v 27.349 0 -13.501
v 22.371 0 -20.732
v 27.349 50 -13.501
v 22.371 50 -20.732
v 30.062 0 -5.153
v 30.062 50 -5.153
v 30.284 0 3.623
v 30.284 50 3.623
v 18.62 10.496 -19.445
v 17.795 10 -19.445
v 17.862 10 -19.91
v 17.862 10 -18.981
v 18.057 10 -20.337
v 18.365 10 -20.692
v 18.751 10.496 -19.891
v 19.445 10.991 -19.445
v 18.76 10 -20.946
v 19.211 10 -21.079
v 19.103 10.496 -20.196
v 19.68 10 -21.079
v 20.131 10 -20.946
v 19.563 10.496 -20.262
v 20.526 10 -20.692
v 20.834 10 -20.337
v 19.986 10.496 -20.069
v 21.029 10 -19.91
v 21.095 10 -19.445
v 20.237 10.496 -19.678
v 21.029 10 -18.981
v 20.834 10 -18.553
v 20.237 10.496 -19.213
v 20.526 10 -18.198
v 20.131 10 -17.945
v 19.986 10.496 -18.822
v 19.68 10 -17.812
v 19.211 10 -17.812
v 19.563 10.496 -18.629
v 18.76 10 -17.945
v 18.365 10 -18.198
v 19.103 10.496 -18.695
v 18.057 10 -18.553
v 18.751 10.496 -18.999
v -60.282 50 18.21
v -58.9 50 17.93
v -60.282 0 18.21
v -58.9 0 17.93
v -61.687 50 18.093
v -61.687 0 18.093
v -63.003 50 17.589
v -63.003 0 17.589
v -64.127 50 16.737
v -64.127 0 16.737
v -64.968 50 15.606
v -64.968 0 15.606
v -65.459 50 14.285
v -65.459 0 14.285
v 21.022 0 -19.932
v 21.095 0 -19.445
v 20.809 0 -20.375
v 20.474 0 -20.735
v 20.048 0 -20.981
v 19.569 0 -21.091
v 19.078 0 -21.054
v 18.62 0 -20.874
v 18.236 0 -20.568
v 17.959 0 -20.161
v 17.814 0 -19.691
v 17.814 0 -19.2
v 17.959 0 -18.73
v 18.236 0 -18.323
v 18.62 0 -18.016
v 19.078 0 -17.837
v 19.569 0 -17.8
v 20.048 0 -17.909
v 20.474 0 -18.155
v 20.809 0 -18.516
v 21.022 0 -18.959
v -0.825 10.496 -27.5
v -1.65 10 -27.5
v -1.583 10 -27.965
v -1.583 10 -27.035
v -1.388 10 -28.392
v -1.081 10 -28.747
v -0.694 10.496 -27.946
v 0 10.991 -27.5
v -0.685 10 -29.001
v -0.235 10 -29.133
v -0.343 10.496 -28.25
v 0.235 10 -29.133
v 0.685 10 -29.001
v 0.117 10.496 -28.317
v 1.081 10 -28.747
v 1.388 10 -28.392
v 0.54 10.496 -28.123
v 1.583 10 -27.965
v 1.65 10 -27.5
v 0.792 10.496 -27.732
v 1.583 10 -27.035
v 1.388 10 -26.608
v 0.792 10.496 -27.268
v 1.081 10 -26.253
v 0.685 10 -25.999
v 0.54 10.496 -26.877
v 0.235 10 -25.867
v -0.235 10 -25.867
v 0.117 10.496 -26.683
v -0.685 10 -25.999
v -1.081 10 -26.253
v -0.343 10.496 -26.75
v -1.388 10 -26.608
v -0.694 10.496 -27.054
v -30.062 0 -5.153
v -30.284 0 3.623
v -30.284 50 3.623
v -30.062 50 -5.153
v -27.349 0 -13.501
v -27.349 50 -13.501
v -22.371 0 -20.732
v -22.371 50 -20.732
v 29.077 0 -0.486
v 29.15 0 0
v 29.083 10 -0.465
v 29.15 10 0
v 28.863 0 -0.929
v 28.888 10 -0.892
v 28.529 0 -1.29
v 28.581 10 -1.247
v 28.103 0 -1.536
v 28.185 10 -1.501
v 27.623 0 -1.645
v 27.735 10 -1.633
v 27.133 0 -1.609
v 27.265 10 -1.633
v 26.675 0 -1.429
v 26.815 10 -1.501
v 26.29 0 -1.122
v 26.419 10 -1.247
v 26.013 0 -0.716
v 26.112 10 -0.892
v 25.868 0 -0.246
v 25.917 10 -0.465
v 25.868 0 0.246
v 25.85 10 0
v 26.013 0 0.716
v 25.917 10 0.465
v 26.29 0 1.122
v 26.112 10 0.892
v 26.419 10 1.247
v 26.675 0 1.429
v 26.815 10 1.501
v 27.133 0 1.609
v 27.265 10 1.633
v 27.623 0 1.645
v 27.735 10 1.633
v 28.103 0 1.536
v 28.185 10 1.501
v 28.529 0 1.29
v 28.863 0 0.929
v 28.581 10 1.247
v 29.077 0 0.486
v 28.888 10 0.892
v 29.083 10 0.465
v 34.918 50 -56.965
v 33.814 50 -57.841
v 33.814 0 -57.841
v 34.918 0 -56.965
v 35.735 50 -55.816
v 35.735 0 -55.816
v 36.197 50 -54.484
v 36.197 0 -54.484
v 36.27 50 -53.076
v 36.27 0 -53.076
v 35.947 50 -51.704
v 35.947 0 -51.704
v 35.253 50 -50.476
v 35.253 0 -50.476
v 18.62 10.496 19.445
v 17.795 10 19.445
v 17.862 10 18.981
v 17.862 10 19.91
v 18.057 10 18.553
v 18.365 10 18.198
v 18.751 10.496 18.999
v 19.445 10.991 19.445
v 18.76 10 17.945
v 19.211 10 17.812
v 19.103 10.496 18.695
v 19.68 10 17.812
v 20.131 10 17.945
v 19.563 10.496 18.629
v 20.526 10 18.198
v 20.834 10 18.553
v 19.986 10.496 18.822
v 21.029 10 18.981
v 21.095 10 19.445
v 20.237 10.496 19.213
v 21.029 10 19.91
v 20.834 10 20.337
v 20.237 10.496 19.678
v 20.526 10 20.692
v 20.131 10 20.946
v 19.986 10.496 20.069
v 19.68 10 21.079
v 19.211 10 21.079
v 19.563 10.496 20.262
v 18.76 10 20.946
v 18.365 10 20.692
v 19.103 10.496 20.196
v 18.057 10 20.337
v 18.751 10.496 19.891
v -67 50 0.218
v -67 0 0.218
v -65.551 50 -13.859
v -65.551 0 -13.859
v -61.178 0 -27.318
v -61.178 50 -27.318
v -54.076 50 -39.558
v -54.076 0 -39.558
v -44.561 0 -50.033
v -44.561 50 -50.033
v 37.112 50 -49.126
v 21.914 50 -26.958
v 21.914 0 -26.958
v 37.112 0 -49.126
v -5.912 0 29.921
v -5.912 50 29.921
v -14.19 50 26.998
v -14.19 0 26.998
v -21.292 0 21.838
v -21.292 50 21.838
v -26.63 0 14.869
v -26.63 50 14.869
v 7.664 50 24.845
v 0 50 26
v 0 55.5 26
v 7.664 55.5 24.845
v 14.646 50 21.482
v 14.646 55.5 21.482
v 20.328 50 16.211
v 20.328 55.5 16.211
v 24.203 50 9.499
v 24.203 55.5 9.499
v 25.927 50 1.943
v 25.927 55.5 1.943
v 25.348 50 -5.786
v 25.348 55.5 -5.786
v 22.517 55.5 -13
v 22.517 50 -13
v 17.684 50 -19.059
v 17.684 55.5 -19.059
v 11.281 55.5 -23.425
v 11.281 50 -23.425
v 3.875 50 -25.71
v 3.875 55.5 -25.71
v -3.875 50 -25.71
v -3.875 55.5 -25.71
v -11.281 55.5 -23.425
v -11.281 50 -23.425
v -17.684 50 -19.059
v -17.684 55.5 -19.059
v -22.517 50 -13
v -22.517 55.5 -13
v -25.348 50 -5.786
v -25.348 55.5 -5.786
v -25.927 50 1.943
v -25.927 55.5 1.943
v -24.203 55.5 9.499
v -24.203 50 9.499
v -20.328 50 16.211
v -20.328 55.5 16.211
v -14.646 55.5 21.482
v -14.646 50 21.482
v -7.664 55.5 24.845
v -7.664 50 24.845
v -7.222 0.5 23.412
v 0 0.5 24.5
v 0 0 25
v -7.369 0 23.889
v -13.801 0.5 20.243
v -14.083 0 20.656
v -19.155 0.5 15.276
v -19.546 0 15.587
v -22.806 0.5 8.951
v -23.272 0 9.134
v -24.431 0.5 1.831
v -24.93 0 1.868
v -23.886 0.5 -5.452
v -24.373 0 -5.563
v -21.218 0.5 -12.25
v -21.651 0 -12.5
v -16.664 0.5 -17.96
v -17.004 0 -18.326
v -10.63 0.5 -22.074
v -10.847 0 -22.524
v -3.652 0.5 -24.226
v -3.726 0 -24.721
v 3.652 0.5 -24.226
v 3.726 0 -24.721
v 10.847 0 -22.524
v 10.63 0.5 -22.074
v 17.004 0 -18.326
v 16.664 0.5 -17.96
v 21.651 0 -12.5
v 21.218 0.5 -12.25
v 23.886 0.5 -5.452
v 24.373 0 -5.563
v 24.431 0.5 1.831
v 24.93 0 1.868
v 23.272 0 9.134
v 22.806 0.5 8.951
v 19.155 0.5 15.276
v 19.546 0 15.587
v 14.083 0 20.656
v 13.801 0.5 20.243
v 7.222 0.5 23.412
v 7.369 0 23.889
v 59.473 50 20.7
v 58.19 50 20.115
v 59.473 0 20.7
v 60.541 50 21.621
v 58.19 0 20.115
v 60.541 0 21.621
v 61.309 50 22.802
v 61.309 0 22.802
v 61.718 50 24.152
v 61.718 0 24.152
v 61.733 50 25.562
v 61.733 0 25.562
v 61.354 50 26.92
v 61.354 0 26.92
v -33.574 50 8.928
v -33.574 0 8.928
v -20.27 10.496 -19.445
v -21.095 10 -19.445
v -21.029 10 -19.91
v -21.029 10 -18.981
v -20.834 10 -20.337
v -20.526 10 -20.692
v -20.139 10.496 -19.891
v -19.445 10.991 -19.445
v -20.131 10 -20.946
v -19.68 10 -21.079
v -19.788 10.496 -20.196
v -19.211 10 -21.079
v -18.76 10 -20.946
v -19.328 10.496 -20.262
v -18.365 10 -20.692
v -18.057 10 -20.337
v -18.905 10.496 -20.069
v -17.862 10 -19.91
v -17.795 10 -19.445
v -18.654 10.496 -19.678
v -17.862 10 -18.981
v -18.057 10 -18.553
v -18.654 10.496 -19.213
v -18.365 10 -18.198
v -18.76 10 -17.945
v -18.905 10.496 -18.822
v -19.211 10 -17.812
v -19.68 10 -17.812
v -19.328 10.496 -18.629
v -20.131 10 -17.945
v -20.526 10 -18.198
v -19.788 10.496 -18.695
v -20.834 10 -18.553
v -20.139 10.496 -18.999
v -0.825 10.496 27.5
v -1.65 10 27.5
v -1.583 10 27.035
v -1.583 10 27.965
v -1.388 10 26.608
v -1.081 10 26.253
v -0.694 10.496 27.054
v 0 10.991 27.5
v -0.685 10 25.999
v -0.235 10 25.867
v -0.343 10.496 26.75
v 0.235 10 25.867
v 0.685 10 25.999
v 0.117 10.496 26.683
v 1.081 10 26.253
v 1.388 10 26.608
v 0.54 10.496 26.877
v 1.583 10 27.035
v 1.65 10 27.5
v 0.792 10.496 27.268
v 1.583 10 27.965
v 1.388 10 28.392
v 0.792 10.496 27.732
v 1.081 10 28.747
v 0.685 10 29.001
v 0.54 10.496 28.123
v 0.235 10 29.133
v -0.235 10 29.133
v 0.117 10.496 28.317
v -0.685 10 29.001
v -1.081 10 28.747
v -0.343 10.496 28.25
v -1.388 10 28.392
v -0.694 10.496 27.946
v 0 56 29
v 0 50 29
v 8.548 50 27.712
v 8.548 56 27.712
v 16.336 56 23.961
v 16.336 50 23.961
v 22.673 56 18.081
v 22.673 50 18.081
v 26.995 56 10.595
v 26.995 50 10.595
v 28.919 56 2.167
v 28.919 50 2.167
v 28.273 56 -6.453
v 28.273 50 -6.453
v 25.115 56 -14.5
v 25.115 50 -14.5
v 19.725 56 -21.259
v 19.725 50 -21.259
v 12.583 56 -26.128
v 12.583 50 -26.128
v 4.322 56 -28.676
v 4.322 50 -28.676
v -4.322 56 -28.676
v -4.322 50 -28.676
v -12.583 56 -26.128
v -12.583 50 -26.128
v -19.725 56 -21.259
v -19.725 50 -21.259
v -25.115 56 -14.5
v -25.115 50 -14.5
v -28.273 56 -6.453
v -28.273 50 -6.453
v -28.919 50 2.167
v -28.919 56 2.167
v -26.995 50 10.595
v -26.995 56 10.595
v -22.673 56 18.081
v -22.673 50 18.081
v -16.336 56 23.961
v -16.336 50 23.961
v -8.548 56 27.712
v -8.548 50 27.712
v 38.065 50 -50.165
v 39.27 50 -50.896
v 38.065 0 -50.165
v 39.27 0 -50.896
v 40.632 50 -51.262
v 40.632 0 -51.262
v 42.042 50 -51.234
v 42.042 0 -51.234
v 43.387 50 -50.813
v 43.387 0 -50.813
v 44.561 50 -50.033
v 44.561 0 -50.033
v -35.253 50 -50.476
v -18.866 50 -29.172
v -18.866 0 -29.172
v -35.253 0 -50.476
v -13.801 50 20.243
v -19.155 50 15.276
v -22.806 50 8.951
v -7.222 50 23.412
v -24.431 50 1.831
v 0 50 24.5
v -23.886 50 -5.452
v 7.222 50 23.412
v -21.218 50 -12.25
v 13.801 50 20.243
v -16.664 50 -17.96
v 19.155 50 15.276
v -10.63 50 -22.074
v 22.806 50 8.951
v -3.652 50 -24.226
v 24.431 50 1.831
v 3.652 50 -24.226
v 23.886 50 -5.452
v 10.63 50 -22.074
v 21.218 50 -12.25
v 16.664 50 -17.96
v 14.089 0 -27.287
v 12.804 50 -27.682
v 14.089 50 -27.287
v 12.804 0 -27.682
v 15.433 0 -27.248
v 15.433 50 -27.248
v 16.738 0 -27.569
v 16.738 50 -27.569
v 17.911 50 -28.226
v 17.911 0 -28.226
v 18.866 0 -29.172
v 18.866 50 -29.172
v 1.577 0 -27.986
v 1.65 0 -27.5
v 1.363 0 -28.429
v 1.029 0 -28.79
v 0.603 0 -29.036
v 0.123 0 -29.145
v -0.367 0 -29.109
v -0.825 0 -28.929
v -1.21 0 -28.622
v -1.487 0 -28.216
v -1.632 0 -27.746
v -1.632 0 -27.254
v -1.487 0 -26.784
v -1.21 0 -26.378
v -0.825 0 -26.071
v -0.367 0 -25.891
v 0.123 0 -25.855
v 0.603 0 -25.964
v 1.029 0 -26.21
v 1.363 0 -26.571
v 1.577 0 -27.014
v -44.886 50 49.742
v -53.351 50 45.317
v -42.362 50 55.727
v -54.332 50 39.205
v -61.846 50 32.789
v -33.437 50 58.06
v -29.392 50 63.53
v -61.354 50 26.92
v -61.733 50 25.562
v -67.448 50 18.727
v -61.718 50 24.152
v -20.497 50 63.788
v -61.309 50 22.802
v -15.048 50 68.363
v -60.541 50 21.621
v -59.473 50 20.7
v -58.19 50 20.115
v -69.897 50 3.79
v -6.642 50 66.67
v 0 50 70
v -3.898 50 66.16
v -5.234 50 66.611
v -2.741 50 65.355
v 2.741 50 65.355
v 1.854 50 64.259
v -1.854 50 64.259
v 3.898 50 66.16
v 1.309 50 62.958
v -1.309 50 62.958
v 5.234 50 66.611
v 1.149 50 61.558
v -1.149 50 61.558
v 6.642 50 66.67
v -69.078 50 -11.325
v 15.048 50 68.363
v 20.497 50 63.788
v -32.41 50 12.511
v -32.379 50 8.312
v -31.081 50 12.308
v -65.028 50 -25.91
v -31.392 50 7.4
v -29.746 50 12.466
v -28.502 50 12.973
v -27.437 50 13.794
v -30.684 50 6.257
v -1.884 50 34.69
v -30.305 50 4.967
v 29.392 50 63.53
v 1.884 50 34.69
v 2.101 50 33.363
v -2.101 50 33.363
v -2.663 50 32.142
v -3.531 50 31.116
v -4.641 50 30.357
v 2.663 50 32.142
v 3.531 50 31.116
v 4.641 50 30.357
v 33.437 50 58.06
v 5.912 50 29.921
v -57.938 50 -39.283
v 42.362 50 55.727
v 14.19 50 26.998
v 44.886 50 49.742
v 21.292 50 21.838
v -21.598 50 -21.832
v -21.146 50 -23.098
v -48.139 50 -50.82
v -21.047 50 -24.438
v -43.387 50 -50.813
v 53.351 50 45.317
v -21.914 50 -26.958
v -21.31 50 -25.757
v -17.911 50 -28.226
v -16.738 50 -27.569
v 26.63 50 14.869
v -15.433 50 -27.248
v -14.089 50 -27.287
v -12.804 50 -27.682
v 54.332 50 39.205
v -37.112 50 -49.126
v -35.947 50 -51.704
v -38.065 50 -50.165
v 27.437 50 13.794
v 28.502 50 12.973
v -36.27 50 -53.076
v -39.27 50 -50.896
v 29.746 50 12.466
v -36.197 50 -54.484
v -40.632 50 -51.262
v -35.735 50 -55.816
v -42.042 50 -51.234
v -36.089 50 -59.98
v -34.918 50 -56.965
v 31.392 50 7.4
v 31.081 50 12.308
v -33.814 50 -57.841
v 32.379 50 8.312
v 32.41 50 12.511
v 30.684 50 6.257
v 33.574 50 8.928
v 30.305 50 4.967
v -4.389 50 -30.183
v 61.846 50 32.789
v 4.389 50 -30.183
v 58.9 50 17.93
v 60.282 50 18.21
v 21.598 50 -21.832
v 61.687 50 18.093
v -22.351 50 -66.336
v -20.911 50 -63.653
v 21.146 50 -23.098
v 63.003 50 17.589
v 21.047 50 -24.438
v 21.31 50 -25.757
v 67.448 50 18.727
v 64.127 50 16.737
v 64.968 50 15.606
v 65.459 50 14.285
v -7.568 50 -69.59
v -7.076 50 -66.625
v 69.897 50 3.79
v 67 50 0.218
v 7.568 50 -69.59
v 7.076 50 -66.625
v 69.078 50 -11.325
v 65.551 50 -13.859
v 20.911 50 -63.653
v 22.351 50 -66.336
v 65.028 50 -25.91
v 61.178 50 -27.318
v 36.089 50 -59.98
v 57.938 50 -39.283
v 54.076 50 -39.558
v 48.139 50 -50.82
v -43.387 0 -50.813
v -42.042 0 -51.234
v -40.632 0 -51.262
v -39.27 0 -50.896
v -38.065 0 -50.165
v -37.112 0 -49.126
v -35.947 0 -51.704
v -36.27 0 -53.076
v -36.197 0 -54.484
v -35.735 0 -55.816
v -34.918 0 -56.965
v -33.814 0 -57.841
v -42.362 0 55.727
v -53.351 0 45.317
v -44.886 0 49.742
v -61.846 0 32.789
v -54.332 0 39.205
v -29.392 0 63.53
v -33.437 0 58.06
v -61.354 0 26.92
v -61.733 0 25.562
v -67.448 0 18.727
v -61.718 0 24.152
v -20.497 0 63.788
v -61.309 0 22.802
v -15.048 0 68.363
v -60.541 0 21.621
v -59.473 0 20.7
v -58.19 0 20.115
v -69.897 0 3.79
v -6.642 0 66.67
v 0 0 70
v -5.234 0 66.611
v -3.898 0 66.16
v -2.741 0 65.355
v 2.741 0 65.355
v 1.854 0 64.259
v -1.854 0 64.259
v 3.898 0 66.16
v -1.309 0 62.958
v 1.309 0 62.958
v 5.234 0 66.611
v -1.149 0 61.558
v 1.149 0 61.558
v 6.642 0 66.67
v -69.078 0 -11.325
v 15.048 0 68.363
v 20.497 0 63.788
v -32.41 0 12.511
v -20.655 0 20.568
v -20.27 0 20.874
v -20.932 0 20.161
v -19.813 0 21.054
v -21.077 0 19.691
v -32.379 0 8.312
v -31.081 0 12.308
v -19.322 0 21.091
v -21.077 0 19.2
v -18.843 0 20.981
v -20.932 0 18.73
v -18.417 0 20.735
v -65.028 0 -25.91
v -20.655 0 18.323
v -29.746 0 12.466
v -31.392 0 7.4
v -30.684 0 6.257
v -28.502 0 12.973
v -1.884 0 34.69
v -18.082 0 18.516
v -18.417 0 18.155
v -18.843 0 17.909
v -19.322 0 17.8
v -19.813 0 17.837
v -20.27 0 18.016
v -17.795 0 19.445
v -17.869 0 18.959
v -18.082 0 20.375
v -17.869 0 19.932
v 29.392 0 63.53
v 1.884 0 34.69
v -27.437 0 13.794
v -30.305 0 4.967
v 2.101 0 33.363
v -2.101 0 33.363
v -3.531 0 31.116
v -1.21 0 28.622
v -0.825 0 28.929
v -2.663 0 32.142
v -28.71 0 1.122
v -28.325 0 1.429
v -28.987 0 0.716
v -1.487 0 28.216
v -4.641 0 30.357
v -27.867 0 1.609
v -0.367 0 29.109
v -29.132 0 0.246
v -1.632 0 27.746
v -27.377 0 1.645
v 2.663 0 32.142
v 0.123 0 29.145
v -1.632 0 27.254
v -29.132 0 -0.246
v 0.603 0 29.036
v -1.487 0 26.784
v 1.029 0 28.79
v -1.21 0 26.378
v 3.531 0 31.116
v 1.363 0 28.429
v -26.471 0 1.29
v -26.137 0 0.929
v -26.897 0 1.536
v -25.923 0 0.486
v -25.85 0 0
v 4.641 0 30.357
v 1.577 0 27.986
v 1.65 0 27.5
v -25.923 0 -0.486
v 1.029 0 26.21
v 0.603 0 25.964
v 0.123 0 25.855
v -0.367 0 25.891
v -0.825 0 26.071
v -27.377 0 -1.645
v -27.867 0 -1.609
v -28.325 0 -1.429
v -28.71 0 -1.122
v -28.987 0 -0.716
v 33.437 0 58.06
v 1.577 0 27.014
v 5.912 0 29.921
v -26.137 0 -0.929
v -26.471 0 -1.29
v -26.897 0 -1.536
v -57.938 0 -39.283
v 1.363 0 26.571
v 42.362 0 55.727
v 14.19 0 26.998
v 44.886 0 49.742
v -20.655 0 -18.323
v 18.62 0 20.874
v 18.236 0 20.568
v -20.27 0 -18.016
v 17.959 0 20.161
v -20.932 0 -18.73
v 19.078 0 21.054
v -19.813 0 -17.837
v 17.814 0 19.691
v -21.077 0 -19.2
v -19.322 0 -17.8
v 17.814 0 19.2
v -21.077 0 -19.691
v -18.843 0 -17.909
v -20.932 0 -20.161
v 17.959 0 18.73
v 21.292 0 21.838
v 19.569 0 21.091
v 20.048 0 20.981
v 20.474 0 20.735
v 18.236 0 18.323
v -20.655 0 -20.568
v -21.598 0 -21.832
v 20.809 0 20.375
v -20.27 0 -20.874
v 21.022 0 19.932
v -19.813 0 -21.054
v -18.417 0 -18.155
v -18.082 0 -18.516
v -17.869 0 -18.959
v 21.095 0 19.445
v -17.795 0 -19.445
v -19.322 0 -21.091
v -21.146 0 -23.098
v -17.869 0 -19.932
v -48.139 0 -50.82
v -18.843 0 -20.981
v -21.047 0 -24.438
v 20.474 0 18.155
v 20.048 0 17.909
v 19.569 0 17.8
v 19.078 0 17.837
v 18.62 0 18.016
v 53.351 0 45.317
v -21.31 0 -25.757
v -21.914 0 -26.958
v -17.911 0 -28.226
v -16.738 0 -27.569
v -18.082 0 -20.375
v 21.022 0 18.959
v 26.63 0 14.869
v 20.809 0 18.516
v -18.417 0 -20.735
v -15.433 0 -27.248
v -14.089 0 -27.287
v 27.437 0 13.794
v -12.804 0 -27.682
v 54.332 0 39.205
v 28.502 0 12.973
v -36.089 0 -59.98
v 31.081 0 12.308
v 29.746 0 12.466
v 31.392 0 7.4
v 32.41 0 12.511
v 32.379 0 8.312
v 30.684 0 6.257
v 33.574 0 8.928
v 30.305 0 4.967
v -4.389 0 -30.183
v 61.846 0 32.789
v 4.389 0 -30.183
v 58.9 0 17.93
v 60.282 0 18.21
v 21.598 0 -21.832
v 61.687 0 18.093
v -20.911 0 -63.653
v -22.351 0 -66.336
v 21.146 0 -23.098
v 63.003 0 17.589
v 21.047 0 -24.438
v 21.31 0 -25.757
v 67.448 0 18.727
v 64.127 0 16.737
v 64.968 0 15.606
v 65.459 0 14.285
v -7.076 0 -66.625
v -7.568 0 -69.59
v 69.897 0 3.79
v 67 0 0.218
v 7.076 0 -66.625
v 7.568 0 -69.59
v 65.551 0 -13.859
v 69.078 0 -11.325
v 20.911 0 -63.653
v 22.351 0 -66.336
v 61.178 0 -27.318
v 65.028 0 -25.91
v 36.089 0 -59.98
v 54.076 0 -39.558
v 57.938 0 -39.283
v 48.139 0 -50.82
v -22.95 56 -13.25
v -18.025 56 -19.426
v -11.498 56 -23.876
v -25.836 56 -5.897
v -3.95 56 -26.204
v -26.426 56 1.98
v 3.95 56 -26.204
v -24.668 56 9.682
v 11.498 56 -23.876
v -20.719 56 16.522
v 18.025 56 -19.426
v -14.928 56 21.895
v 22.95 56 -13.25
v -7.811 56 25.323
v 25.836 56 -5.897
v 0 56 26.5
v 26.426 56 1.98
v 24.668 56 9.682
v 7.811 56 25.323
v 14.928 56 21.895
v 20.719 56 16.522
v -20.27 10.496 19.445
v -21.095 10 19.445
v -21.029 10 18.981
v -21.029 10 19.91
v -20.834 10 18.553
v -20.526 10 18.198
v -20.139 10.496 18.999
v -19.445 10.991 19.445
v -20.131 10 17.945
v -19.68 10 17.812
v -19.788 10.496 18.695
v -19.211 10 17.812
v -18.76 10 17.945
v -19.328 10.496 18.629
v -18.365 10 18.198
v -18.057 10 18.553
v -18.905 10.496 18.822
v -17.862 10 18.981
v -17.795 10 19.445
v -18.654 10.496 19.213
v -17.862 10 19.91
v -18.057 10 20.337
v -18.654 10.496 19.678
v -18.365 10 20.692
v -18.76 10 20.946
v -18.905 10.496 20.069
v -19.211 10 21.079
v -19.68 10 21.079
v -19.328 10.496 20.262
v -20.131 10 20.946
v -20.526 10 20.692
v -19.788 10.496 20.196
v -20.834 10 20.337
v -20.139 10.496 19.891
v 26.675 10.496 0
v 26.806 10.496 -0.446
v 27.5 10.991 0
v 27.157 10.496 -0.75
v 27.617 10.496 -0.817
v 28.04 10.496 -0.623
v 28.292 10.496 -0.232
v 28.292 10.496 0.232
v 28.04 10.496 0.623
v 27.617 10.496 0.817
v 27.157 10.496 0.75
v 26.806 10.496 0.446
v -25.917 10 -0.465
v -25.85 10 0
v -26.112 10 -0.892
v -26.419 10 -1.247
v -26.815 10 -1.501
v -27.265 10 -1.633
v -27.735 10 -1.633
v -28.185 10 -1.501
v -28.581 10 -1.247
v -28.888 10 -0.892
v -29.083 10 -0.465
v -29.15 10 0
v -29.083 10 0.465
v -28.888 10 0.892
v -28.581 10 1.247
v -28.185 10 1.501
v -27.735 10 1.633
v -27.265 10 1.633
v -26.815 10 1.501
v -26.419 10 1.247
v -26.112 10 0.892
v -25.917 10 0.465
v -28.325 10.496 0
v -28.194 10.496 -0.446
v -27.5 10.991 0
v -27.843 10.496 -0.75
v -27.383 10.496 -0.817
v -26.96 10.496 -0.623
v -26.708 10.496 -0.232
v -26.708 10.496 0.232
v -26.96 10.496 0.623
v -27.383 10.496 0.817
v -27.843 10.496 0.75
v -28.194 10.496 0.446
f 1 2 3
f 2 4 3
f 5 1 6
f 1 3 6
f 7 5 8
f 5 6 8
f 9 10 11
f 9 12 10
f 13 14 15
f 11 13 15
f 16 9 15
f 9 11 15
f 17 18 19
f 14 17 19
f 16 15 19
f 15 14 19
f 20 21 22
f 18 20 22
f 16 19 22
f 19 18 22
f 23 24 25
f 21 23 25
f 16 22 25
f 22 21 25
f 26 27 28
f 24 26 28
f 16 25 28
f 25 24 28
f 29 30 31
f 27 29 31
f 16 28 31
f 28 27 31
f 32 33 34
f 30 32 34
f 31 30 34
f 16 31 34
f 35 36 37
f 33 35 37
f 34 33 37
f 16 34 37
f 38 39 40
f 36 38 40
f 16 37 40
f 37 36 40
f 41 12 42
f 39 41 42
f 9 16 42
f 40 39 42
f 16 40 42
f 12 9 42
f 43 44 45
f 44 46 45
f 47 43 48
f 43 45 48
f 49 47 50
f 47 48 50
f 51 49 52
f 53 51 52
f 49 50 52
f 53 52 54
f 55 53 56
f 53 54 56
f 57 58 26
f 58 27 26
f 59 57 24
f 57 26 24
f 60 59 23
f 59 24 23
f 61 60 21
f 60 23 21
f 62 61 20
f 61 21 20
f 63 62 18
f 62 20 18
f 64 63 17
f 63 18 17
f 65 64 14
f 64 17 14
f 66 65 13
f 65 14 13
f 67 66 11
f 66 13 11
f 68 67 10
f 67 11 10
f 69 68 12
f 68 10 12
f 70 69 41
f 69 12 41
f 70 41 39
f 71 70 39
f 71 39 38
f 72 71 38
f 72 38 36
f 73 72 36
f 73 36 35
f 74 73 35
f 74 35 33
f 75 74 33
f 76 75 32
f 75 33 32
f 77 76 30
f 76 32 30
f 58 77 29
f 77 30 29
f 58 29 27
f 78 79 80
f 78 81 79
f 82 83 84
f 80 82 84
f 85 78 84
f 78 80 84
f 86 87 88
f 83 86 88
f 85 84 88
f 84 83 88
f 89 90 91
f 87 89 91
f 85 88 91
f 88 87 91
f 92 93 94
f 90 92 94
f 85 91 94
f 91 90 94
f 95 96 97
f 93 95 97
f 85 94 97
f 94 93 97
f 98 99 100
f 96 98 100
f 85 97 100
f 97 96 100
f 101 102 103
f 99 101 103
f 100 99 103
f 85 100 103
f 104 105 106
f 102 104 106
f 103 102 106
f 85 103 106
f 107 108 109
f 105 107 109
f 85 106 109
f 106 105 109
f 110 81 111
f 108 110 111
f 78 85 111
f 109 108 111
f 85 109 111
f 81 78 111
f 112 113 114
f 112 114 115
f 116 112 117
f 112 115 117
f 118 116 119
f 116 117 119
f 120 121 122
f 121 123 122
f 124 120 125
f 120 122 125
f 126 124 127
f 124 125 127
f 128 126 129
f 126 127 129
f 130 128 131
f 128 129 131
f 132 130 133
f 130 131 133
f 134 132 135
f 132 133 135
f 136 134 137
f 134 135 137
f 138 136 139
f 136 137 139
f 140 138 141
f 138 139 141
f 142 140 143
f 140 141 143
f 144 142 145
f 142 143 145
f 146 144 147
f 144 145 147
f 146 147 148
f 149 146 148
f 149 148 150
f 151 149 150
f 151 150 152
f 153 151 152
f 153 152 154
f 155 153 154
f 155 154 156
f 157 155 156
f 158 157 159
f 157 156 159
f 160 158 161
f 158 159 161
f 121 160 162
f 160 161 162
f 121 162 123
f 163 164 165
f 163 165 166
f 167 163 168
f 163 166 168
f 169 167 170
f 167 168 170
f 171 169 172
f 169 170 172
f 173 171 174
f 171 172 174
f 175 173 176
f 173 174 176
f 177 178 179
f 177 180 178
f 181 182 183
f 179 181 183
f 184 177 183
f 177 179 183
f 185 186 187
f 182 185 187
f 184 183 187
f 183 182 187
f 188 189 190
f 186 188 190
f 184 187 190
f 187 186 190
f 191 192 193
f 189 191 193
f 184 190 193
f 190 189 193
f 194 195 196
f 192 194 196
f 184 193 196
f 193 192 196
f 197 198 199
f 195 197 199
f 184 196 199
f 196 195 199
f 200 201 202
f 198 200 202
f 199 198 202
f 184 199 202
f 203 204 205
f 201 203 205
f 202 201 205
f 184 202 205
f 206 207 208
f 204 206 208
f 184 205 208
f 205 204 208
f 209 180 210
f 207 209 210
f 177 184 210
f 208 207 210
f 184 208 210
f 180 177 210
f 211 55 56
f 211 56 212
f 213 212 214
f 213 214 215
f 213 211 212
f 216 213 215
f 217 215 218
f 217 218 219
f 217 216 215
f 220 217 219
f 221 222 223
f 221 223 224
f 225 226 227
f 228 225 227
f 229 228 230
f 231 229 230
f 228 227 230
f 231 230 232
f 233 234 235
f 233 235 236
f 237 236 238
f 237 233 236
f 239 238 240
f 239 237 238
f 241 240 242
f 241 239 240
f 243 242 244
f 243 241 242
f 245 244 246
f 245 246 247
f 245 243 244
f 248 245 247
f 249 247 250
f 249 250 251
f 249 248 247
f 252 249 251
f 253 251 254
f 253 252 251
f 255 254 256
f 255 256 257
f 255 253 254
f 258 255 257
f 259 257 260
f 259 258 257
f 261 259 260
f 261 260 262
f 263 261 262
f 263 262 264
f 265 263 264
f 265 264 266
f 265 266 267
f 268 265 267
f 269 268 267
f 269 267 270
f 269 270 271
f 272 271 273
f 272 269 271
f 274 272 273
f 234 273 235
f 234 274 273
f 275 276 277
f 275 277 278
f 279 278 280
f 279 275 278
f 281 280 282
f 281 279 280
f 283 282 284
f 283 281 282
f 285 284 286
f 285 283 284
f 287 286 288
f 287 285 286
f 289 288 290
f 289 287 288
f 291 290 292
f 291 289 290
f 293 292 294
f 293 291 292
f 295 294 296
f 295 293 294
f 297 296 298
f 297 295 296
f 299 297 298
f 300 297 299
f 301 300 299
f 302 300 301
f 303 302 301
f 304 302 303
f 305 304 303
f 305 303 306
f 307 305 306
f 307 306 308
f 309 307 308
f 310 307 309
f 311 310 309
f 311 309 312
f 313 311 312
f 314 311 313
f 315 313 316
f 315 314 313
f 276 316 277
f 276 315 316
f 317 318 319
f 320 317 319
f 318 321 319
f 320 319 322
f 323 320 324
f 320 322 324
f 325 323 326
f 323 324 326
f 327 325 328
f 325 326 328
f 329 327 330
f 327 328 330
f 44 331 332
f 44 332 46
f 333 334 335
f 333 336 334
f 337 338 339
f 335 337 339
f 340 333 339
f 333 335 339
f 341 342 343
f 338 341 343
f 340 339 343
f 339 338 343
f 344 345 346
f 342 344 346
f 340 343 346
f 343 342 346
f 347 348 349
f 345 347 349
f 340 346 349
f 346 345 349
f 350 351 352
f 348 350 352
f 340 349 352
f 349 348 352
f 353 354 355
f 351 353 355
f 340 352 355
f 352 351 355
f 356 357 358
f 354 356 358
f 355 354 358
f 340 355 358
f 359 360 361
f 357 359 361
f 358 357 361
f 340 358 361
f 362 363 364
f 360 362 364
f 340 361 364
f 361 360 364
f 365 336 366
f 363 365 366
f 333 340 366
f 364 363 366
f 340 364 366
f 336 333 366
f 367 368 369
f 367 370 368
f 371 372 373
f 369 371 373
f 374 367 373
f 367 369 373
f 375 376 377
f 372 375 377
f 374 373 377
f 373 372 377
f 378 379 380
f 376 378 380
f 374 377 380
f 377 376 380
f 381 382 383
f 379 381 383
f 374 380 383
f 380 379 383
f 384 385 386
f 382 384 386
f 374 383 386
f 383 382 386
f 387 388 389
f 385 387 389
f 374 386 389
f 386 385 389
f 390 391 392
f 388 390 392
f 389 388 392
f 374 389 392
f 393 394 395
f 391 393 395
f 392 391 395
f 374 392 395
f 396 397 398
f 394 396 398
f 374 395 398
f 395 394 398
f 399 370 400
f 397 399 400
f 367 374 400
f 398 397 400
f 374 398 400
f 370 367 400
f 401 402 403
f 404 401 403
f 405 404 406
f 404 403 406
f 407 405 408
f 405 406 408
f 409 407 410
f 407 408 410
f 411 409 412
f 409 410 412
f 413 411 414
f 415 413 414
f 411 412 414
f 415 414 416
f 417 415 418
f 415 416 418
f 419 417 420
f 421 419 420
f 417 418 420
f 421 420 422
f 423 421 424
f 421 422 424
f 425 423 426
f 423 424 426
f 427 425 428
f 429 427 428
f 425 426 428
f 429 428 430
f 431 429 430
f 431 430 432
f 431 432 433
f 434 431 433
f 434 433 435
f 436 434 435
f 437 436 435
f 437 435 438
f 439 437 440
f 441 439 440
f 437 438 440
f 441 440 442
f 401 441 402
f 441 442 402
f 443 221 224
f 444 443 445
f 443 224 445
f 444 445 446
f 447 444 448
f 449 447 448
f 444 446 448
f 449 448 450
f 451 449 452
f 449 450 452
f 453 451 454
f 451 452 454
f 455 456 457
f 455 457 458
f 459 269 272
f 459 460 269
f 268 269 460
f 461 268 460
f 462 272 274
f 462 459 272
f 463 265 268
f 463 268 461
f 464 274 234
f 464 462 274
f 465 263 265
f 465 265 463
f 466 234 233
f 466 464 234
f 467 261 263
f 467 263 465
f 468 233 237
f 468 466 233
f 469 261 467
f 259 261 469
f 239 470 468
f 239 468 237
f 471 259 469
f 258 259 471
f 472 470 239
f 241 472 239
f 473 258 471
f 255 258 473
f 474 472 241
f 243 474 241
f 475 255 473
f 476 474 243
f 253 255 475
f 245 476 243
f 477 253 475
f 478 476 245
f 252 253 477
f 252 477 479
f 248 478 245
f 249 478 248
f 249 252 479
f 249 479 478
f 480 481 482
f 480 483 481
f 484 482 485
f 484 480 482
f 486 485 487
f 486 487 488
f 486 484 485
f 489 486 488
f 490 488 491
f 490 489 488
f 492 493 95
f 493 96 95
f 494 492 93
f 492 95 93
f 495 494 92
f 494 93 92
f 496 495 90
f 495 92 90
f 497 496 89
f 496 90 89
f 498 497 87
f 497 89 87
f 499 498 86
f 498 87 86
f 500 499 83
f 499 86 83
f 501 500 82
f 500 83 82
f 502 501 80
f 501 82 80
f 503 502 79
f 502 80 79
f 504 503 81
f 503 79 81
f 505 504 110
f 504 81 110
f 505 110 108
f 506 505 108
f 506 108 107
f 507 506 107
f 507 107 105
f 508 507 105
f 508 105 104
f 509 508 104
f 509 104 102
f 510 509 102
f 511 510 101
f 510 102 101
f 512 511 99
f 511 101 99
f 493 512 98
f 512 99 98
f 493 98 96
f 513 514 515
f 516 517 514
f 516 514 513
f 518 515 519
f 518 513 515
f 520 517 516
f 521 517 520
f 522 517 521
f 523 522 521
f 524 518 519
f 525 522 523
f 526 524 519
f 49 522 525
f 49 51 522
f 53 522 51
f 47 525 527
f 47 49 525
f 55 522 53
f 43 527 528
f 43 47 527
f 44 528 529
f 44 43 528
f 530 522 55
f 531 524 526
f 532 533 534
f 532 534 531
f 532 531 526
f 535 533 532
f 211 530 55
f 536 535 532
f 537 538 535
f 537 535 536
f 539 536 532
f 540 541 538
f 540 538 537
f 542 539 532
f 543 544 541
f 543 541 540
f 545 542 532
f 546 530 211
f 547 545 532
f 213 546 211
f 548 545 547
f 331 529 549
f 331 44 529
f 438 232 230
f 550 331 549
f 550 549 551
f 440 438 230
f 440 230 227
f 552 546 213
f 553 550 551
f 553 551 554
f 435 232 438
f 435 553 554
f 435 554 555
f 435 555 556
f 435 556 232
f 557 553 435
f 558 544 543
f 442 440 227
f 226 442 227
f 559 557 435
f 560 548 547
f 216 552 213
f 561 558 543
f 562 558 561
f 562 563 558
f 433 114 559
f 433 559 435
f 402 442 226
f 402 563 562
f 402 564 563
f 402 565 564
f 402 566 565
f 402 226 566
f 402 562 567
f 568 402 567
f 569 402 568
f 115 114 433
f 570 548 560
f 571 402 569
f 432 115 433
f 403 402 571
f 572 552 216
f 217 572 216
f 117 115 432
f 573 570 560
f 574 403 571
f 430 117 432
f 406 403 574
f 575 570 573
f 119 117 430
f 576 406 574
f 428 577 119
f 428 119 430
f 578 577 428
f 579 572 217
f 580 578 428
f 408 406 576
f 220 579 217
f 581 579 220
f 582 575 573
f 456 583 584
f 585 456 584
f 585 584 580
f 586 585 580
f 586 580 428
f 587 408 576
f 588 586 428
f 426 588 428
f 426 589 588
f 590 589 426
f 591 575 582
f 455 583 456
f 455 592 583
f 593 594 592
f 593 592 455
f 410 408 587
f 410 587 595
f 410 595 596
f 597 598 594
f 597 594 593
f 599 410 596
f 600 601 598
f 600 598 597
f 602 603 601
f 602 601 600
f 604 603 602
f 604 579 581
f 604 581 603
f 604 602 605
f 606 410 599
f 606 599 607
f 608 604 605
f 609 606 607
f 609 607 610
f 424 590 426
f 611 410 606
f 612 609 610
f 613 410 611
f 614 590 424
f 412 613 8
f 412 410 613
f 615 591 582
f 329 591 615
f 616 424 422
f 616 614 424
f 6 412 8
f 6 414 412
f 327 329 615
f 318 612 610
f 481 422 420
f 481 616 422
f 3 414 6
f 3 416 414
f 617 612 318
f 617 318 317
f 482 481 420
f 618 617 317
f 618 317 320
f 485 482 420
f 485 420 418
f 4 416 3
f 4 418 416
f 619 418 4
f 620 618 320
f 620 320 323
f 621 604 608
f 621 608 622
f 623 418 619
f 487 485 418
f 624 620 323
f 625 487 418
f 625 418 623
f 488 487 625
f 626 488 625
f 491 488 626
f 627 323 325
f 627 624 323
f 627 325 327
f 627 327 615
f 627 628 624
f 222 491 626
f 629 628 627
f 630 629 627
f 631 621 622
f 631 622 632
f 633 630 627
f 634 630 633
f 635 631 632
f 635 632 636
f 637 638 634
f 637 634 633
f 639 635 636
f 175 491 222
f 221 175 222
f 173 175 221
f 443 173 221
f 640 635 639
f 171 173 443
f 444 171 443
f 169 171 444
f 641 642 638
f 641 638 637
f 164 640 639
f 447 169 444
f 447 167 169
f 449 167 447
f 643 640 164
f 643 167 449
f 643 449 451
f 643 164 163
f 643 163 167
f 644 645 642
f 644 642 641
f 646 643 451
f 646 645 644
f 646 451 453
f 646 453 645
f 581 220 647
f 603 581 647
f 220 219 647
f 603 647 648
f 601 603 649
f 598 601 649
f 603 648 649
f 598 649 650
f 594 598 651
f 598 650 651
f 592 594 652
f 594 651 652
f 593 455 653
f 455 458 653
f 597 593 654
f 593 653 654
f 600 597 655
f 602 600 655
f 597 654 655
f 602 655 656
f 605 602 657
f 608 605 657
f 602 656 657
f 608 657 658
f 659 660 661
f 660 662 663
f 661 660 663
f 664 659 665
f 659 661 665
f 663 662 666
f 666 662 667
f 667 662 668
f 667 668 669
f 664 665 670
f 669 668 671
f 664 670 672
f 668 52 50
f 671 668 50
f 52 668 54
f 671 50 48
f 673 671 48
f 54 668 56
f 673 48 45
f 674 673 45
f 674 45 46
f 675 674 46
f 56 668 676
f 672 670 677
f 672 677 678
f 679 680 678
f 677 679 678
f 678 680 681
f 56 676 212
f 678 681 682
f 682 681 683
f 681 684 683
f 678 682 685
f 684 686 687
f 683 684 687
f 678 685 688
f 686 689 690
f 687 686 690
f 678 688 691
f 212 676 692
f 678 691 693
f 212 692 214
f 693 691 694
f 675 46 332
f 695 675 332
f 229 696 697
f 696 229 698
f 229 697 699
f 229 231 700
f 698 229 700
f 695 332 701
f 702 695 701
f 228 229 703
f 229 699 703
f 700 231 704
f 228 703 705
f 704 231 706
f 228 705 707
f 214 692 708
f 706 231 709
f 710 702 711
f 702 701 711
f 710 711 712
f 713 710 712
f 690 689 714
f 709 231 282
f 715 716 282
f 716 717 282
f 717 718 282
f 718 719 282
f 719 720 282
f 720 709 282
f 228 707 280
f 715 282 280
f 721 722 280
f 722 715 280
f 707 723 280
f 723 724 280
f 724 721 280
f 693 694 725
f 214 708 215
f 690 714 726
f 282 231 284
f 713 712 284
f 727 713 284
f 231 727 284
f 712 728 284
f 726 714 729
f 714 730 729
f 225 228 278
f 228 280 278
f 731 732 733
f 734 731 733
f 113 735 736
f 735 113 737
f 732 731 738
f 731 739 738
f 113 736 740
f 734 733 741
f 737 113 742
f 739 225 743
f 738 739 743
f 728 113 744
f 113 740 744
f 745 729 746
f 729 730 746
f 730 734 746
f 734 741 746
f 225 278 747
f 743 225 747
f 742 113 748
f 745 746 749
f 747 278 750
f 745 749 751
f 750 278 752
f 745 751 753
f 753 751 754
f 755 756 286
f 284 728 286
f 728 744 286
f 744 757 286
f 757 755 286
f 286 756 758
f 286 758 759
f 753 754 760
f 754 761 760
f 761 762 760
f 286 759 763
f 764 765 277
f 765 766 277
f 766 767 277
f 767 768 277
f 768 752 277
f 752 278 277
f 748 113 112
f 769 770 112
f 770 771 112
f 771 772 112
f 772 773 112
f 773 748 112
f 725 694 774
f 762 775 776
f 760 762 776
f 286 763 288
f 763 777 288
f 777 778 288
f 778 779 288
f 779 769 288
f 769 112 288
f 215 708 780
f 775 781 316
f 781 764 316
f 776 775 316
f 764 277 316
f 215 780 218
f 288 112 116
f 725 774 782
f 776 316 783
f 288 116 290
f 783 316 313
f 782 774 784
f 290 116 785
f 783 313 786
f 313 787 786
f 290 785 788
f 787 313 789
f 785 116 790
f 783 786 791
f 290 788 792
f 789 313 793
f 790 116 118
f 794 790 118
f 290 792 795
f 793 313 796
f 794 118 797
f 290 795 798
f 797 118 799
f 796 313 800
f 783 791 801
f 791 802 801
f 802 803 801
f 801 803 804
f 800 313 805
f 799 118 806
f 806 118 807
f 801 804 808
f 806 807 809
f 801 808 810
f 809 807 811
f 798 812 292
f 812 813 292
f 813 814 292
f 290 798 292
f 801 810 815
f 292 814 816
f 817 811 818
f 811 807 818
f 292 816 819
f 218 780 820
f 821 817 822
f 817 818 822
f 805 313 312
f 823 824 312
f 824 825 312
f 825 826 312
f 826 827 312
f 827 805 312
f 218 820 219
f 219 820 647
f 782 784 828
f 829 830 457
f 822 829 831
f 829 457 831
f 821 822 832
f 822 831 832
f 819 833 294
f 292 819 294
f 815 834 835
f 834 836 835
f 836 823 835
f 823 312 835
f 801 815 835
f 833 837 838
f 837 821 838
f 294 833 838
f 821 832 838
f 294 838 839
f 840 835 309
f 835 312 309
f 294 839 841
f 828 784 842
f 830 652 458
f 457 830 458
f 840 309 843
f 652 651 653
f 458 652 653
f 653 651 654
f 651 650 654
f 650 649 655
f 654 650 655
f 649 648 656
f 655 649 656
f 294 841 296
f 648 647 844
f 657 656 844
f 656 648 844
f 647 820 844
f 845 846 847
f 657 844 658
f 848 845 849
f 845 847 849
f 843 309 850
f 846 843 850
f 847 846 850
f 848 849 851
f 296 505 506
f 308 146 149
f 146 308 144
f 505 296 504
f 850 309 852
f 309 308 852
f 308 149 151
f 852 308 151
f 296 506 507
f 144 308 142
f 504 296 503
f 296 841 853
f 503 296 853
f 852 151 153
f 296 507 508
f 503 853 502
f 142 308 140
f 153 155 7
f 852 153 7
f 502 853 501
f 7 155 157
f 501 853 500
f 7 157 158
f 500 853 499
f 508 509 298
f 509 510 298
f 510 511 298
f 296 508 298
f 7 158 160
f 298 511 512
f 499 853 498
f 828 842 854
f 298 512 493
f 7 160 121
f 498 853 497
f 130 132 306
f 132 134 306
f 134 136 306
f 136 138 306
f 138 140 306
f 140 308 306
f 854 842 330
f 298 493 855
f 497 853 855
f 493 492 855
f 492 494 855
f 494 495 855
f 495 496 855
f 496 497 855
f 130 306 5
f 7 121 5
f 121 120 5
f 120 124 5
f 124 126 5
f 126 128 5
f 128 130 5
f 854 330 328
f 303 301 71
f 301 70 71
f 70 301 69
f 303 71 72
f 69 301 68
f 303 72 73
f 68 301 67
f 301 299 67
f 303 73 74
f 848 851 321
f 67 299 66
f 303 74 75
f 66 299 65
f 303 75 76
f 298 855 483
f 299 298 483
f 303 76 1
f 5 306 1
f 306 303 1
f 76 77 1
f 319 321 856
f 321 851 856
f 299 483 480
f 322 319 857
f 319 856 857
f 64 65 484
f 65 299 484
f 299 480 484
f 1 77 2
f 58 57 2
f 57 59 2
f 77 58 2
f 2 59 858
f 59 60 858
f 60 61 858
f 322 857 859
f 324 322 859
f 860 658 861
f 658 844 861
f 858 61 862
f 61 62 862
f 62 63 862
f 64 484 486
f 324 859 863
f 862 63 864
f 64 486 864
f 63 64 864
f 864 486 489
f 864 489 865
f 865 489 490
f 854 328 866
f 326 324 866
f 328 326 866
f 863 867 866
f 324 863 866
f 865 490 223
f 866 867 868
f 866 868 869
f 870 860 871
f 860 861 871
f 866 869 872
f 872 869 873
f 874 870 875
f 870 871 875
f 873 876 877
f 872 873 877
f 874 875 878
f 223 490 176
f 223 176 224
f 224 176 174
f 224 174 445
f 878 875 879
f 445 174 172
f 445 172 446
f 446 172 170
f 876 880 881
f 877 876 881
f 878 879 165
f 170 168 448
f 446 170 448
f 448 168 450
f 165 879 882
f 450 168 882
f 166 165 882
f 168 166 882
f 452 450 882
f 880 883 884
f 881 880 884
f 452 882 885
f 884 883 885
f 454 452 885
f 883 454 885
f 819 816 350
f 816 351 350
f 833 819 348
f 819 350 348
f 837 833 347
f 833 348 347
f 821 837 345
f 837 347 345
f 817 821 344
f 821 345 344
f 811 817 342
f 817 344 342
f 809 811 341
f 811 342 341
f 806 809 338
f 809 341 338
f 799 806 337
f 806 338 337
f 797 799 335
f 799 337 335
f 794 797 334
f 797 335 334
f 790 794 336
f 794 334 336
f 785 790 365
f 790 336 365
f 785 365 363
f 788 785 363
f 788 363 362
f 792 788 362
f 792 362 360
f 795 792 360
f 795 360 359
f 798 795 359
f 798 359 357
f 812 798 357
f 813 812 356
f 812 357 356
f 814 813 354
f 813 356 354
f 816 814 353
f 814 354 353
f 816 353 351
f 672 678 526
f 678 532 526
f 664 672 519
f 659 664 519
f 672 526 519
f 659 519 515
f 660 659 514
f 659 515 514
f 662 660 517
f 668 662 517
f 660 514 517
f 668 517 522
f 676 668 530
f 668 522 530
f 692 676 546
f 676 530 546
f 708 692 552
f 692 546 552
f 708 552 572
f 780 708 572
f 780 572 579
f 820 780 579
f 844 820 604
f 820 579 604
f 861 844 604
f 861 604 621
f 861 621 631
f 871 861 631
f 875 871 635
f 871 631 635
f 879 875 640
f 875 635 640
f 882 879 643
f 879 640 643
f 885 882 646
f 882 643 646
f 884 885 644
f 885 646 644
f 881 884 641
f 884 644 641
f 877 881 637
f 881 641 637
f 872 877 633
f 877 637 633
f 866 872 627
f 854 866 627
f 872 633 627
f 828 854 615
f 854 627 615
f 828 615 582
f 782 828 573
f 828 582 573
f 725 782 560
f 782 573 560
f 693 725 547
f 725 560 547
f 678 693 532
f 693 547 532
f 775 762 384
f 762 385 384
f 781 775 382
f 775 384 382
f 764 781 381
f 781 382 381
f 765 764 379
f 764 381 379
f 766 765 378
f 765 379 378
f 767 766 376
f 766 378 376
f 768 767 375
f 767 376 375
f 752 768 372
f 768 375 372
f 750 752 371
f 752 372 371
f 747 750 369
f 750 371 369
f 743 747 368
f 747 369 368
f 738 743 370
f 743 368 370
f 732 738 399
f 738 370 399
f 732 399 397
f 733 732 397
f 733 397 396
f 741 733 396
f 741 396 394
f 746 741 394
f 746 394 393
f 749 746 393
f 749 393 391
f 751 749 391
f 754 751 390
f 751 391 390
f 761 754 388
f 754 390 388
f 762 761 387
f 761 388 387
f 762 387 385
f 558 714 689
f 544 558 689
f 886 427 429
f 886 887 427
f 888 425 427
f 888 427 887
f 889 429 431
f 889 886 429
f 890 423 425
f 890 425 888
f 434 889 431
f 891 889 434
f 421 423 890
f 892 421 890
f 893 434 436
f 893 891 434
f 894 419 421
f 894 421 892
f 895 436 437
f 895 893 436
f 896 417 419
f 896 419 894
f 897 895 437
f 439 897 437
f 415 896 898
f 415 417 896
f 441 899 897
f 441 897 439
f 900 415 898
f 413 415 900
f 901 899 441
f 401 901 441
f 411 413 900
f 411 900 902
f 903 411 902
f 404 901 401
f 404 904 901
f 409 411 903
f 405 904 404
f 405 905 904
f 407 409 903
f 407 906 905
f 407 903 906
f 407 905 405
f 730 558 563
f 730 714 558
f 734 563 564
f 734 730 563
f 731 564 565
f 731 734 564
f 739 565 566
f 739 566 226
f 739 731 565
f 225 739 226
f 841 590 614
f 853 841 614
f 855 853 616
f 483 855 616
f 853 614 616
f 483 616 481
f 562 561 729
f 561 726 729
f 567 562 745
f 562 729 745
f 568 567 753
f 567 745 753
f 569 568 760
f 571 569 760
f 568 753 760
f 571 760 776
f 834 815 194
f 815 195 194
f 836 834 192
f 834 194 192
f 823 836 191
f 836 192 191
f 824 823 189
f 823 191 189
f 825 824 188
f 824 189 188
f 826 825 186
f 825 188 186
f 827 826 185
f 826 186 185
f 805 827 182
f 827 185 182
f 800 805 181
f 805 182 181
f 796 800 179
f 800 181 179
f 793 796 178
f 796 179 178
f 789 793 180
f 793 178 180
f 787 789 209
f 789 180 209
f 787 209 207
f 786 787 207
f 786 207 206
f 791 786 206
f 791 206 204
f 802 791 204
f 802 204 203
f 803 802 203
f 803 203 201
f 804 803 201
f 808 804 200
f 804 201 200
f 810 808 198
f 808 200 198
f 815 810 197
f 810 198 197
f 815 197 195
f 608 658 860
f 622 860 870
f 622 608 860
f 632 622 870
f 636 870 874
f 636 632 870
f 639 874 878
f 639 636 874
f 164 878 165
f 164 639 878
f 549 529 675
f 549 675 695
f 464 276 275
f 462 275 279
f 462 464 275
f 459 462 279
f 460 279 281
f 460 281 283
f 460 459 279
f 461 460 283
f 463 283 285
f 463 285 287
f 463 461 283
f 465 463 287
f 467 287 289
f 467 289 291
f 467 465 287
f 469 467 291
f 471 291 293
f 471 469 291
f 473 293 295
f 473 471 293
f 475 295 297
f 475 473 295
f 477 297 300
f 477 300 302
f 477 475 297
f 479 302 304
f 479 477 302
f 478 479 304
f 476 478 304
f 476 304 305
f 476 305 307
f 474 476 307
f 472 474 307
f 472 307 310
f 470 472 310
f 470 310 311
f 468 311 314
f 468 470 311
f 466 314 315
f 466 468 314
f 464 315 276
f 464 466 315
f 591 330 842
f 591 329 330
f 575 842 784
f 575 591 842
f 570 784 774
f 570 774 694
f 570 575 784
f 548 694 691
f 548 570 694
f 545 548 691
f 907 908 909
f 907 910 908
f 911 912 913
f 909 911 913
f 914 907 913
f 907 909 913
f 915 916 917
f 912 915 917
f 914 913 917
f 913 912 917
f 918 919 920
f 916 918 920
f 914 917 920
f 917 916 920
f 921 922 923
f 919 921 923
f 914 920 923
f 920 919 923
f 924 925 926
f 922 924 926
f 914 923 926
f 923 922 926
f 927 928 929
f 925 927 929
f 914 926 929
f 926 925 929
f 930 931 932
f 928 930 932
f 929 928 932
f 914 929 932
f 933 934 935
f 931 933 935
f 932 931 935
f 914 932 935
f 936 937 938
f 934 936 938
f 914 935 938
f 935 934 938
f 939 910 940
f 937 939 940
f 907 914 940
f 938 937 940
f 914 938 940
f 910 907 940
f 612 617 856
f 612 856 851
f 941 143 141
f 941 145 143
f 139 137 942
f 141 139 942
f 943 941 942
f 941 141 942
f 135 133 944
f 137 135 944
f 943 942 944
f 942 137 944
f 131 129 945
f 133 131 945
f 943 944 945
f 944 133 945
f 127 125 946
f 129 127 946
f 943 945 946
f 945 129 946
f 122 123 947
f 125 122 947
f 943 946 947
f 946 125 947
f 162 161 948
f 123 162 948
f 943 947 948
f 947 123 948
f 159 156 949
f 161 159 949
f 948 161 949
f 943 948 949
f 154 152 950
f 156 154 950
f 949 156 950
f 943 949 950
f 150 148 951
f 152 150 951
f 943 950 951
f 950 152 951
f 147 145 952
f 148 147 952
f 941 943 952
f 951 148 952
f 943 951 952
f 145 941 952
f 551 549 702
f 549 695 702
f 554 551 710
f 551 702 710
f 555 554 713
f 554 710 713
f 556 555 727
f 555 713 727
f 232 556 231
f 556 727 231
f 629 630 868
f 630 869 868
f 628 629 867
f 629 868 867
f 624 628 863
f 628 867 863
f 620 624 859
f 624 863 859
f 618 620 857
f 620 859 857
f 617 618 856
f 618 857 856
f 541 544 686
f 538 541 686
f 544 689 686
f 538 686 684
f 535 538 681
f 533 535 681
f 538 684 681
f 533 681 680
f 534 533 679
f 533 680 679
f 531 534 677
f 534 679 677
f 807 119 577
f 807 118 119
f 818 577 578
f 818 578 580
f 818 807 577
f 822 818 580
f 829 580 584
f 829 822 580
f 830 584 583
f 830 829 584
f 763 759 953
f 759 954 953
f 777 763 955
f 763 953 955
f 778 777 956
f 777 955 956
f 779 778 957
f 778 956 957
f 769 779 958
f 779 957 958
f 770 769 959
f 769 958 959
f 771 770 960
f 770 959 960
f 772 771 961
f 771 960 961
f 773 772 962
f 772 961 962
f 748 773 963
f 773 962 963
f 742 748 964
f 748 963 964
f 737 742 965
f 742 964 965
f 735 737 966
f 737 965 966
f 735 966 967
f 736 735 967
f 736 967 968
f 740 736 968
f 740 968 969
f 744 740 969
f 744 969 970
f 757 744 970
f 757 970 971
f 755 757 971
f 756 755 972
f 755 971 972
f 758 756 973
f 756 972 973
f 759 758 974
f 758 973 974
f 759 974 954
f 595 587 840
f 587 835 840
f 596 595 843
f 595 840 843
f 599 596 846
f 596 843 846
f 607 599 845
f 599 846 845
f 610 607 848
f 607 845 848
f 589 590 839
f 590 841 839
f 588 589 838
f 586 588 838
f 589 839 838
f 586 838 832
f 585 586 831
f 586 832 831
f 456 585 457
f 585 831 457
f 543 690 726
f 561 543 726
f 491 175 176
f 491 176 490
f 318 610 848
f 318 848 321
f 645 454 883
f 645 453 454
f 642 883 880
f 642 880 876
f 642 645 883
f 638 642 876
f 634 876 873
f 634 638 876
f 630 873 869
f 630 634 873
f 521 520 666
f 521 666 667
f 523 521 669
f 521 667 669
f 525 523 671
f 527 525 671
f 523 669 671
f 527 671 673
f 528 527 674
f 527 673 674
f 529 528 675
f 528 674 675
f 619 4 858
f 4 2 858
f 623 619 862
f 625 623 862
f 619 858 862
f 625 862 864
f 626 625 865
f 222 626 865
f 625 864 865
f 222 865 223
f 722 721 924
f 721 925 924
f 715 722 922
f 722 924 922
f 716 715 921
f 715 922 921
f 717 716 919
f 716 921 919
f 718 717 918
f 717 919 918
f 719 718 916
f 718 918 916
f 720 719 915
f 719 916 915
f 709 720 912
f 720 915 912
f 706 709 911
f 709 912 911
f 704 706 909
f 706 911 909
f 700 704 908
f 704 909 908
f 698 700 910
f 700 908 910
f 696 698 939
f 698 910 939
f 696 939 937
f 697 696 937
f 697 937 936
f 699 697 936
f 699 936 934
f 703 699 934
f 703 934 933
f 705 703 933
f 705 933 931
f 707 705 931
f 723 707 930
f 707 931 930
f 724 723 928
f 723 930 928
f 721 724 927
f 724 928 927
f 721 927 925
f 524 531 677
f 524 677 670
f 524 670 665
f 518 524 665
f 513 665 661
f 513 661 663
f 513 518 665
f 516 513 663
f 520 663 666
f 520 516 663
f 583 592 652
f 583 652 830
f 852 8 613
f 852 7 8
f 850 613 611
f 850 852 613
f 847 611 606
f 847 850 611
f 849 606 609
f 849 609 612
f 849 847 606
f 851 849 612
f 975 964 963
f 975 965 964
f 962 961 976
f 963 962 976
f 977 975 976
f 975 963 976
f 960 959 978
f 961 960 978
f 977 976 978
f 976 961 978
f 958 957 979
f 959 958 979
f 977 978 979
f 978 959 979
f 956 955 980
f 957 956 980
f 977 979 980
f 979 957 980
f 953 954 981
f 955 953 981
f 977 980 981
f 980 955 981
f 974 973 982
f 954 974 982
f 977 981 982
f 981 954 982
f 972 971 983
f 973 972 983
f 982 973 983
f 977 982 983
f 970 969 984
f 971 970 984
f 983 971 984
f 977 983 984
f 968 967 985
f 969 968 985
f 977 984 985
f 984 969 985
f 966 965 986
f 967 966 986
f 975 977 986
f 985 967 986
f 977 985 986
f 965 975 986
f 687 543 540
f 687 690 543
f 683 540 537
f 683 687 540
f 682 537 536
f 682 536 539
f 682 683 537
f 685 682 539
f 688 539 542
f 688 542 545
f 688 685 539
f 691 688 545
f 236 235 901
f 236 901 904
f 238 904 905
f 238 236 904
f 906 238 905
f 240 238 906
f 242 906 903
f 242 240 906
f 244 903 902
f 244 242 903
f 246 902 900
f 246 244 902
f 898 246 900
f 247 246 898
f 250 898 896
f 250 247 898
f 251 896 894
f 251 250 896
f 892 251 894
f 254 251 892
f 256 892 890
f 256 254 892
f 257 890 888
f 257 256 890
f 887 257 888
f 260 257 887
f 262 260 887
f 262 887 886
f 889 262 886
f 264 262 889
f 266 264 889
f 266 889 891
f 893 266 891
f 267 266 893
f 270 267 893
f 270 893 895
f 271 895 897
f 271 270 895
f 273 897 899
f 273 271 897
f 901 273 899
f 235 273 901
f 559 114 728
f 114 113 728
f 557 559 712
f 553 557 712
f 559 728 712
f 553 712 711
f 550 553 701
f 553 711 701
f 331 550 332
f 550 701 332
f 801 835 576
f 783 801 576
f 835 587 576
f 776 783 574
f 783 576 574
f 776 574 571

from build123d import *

# Parameters (mm, degrees)
SKETCH_1_W             = 6
SKETCH_1_H             = 50
SKETCH_1_W_2           = 3
HOLE_WIZARD_M4_1_D     = 3.3
HOLE_WIZARD_M4_1_DEPTH = 10
HOLE_WIZARD_M4_1_TIP   = 0.991420021
EXTRUDE_1_DEPTH        = 50
SKETCH_7_R             = 29
SKETCH_7_R_2           = 26
EXTRUDE_3_DEPTH        = 6
CHAMFER_1_SIZE         = 0.5
FILLET_1_R             = 5


with BuildPart() as part:
    # 草图1 → 旋转1 (revolve)
    with BuildSketch(Plane.XY, mode=Mode.PRIVATE) as revolve_1_sk:
        with Locations((27.5, 25)):
            Rectangle(SKETCH_1_W, SKETCH_1_H)
        with Locations((68.5, 25)):
            Rectangle(SKETCH_1_W_2, SKETCH_1_H)
    revolve(revolve_1_sk.sketch.rotate(Axis((0, 82.659451531, 0), (0, -1, 0)), 90), axis=Axis((0, 82.659451531, 0), (0, -1, 0)))

    # M4 螺纹孔1
    with Locations(Plane(origin=(0, 0, 0), x_dir=(-1, 0, 0), z_dir=(0, -1, 0))):
        with Locations((0, 27.5), (19.445436483, -19.445436483), (27.5, 0), (19.445436483, 19.445436483), (0, -27.5), (-19.445436483, -19.445436483), (-27.5, 0), (-19.445436483, 19.445436483)):
            Hole(HOLE_WIZARD_M4_1_D / 2, depth=HOLE_WIZARD_M4_1_DEPTH)
            with Locations((0, 0, -(HOLE_WIZARD_M4_1_DEPTH + HOLE_WIZARD_M4_1_TIP / 2))):  # 118° drill point
                Cone(0, HOLE_WIZARD_M4_1_D / 2, HOLE_WIZARD_M4_1_TIP, mode=Mode.SUBTRACT)

    # 草图5 → 凸台-拉伸1 (add)
    with BuildSketch(Plane(origin=(0, 50, 0), x_dir=(1, 0, 0), z_dir=(0, 1, 0))):
        with BuildLine():
            Line((1, -66.992536898), (2, -30.434355587))
            ThreePointArc((2, -30.434355587), (0, -30.5), (-2, -30.434355587))
            Line((-2, -30.434355587), (-1, -66.992536898))
            ThreePointArc((-1, -66.992536898), (0, -67), (1, -66.992536898))
        make_face()
        with BuildLine():
            ThreePointArc((-28.326758212, -11.306846122), (-29.007223747, -9.425018328), (-29.562826189, -7.502620057))
            Line((-29.562826189, -7.502620057), (-64.022705754, -19.750775881))
            ThreePointArc((-64.022705754, -19.750775881), (-63.720786592, -20.704138623), (-63.404671765, -21.652888914))
            Line((-63.404671765, -21.652888914), (-28.326758212, -11.306846122))
        make_face()
        with BuildLine():
            ThreePointArc((-19.506899366, 23.446340378), (-17.927450195, 24.675018328), (-16.270831388, 25.797481387))
            Line((-16.270831388, 25.797481387), (-38.568208208, 54.785886099))
            ThreePointArc((-38.568208208, 54.785886099), (-39.381611904, 54.204138623), (-40.186242197, 53.610315594))
            Line((-40.186242197, 53.610315594), (-19.506899366, 23.446340378))
        make_face()
        with BuildLine():
            ThreePointArc((16.270831388, 25.797481387), (17.927450195, 24.675018328), (19.506899366, 23.446340378))
            Line((19.506899366, 23.446340378), (40.186242197, 53.610315594))
            ThreePointArc((40.186242197, 53.610315594), (39.381611904, 54.204138623), (38.568208208, 54.785886099))
            Line((38.568208208, 54.785886099), (16.270831388, 25.797481387))
        make_face()
        with BuildLine():
            ThreePointArc((29.562826189, -7.502620057), (29.007223747, -9.425018328), (28.326758212, -11.306846122))
            Line((28.326758212, -11.306846122), (63.404671765, -21.652888914))
            ThreePointArc((63.404671765, -21.652888914), (63.720786592, -20.704138623), (64.022705754, -19.750775881))
            Line((64.022705754, -19.750775881), (29.562826189, -7.502620057))
        make_face()
    extrude(amount=-EXTRUDE_1_DEPTH)

    # 草图7 → 凸台-拉伸3 (add)
    with BuildSketch(Plane(origin=(0, 50, 0), x_dir=(1, 0, 0), z_dir=(0, 1, 0))):
        with Locations(Location((0, 0, 0), (0, 0, 270))):
            Circle(SKETCH_7_R)
        with Locations(Location((0, 0, 0), (0, 0, 270))):
            Circle(SKETCH_7_R_2, mode=Mode.SUBTRACT)
    extrude(amount=EXTRUDE_3_DEPTH)

    # 倒角1
    chamfer_1_edges = [part.edges().sort_by_distance(p)[0] for p in [
        (0, 56, -26),
        (0, 0, -24.5),
    ]]
    chamfer(chamfer_1_edges, length=CHAMFER_1_SIZE)

    # 圆角1
    fillet_1_edges = [part.edges().sort_by_distance(p)[0] for p in [
        (-2, 25, 30.434355587),
        (2, 25, 30.434355587),
        (1, 25, 66.992536898),
        (-1, 25, 66.992536898),
        (-29.562826189, 25, 7.502620057),
        (-28.326758212, 25, 11.306846122),
        (-63.404671765, 25, 21.652888914),
        (-64.022705754, 25, 19.750775881),
        (-16.270831388, 25, -25.797481387),
        (-19.506899366, 25, -23.446340378),
        (-40.186242197, 25, -53.610315594),
        (-38.568208208, 25, -54.785886099),
        (19.506899366, 25, -23.446340378),
        (16.270831388, 25, -25.797481387),
        (38.568208208, 25, -54.785886099),
        (40.186242197, 25, -53.610315594),
        (28.326758212, 25, 11.306846122),
        (29.562826189, 25, 7.502620057),
        (64.022705754, 25, 19.750775881),
        (63.404671765, 25, 21.652888914),
    ]]
    fillet(fillet_1_edges, radius=FILLET_1_R)


solid = part.part
